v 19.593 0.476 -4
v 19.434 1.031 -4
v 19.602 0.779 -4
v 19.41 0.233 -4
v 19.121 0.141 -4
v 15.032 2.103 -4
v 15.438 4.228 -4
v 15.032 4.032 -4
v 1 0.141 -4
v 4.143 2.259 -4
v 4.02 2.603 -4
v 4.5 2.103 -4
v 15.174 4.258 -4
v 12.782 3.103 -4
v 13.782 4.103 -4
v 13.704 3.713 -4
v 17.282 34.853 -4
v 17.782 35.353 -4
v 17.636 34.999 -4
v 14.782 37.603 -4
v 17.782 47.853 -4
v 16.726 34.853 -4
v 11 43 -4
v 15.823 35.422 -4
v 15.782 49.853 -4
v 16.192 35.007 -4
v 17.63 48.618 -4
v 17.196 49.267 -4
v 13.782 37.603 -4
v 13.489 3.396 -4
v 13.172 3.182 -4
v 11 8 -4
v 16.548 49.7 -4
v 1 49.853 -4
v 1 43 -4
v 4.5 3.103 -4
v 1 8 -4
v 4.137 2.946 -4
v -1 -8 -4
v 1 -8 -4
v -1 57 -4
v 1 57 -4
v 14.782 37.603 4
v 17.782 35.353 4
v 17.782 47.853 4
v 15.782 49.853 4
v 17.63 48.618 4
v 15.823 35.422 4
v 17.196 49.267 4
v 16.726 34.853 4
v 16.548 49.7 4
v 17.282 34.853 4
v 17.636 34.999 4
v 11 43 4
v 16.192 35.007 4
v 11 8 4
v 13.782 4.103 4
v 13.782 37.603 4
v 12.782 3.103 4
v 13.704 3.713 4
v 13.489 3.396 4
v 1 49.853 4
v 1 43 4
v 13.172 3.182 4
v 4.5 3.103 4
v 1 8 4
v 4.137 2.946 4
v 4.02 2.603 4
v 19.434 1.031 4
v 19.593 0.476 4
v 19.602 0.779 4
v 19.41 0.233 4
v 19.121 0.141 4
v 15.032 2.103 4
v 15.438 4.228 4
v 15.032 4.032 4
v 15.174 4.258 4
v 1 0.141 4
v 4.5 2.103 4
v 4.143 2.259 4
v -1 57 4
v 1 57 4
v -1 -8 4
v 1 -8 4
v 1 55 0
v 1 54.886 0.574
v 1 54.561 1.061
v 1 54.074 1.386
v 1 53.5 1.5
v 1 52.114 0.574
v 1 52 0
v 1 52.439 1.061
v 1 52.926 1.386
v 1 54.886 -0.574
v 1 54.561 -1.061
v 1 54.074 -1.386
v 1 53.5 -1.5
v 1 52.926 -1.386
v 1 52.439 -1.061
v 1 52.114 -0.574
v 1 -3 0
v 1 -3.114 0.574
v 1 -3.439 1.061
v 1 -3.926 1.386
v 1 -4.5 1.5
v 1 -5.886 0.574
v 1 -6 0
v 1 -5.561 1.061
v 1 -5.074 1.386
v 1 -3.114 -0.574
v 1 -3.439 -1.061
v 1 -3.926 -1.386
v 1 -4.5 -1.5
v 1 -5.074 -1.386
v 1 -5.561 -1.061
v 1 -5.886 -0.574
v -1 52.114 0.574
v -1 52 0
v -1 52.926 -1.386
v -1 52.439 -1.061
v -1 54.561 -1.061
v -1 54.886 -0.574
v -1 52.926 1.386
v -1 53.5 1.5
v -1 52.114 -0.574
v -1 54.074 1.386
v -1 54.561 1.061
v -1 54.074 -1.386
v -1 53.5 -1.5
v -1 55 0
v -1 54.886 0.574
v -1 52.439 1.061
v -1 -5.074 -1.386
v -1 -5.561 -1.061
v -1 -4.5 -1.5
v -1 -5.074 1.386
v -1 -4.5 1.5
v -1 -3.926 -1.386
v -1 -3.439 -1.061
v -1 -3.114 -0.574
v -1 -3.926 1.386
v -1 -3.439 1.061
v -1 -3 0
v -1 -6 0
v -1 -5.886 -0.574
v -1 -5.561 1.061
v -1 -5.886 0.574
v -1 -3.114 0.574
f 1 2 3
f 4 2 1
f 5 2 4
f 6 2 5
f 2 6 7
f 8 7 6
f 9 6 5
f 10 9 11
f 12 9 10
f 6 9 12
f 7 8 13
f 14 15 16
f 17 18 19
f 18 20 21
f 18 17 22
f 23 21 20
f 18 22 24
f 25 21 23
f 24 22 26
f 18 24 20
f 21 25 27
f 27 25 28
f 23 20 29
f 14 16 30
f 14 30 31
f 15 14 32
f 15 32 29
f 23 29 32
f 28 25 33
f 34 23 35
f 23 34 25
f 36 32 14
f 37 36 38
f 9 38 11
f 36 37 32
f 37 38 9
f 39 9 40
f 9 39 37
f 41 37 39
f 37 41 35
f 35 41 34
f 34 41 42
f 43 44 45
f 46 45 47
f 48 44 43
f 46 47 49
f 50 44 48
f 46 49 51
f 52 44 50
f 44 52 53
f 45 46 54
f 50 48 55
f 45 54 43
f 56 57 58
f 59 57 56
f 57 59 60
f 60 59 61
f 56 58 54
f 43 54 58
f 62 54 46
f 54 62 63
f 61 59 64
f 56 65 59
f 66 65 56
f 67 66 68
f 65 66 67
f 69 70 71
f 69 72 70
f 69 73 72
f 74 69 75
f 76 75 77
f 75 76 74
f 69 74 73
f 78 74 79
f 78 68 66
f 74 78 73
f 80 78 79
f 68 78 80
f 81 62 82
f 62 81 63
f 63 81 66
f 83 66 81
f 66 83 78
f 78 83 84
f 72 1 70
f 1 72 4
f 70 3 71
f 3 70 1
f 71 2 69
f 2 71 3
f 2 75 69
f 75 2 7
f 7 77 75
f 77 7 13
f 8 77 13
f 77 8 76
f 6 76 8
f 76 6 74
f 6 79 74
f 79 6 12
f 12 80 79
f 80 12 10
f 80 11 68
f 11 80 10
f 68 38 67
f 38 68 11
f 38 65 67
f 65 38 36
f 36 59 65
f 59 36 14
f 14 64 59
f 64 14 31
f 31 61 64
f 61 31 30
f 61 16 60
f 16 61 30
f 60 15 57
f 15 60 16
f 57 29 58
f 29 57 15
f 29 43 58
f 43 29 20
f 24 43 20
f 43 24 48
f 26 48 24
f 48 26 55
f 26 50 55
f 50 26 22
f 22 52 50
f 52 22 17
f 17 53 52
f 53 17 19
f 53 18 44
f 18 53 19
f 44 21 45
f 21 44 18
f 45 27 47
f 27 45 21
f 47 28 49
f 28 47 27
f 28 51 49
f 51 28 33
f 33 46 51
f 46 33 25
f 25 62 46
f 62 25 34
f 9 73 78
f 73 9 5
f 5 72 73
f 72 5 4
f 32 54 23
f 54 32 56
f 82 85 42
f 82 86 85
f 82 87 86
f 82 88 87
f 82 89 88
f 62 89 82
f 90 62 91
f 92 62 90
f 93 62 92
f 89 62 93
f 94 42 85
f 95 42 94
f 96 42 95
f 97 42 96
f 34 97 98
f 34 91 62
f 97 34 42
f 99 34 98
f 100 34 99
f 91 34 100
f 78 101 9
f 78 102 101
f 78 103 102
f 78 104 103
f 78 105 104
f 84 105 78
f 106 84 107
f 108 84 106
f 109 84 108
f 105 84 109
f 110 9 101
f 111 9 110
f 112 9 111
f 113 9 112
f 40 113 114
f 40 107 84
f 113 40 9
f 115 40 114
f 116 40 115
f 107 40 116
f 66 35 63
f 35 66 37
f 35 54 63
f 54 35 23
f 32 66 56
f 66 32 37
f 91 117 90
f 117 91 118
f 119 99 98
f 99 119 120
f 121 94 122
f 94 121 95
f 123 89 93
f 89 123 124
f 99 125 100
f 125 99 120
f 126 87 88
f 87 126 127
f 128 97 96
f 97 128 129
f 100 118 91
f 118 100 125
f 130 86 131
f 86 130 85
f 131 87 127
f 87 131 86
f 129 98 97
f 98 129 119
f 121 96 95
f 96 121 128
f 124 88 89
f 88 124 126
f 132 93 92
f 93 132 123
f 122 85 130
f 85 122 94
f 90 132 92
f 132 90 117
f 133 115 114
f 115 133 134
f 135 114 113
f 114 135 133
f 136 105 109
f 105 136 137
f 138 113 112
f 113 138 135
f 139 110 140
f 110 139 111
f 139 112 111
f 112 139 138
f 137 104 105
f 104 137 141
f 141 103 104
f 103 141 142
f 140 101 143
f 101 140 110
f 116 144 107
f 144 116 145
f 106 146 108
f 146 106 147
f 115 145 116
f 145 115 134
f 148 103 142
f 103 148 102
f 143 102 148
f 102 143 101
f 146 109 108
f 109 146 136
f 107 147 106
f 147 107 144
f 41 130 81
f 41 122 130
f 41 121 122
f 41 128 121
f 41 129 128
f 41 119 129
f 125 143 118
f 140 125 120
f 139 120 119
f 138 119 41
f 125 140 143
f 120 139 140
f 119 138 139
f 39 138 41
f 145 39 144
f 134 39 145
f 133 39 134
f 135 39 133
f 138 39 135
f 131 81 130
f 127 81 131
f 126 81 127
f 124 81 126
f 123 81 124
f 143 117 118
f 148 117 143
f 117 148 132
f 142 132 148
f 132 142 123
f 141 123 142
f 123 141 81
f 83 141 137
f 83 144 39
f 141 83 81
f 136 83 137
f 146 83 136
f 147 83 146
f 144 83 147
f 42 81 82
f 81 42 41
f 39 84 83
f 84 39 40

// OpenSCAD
CLIP_H = 8;
HOLE_DEPTH = 9;
HOLE_DIAMETER = 3;
HEIGHT = 2;
EMPTYLength = 35;
EMPTYWidth = 10;
TotalSize = 65;
Upper = 8;

module din_clip() {
	
    union() {
        difference() {
            linear_extrude(height=CLIP_H, center=true, convexity=5) {
                import(file="din_clip_01.dxf", layer="0", $fn=64);
            }
            
            translate([6, (EMPTYLength / 2) + 8 , 0]) {
                cube([ EMPTYWidth,  EMPTYLength, CLIP_H], center = true);
            }
        }
        
        translate([0, TotalSize / 2 - Upper, 0]) {
            difference() {
                cube([HEIGHT, TotalSize, CLIP_H], center = true);
            
                union() {

                    translate([-HEIGHT, TotalSize / 2 - (2 + HOLE_DIAMETER / 2), 0]) {
                        rotate([0, 90, 0]) {
                            cylinder(h= HOLE_DEPTH, r = HOLE_DIAMETER / 2, $fn = 16);
                        }
                    }

                    translate([-HEIGHT, -TotalSize / 2 + (2 + HOLE_DIAMETER / 2), 0]) {
                        rotate([0, 90, 0]) {
                            cylinder(h= HOLE_DEPTH, r = HOLE_DIAMETER / 2, $fn = 16);
                        }
                    }
                }
            }
        }
    }
}

din_clip();
